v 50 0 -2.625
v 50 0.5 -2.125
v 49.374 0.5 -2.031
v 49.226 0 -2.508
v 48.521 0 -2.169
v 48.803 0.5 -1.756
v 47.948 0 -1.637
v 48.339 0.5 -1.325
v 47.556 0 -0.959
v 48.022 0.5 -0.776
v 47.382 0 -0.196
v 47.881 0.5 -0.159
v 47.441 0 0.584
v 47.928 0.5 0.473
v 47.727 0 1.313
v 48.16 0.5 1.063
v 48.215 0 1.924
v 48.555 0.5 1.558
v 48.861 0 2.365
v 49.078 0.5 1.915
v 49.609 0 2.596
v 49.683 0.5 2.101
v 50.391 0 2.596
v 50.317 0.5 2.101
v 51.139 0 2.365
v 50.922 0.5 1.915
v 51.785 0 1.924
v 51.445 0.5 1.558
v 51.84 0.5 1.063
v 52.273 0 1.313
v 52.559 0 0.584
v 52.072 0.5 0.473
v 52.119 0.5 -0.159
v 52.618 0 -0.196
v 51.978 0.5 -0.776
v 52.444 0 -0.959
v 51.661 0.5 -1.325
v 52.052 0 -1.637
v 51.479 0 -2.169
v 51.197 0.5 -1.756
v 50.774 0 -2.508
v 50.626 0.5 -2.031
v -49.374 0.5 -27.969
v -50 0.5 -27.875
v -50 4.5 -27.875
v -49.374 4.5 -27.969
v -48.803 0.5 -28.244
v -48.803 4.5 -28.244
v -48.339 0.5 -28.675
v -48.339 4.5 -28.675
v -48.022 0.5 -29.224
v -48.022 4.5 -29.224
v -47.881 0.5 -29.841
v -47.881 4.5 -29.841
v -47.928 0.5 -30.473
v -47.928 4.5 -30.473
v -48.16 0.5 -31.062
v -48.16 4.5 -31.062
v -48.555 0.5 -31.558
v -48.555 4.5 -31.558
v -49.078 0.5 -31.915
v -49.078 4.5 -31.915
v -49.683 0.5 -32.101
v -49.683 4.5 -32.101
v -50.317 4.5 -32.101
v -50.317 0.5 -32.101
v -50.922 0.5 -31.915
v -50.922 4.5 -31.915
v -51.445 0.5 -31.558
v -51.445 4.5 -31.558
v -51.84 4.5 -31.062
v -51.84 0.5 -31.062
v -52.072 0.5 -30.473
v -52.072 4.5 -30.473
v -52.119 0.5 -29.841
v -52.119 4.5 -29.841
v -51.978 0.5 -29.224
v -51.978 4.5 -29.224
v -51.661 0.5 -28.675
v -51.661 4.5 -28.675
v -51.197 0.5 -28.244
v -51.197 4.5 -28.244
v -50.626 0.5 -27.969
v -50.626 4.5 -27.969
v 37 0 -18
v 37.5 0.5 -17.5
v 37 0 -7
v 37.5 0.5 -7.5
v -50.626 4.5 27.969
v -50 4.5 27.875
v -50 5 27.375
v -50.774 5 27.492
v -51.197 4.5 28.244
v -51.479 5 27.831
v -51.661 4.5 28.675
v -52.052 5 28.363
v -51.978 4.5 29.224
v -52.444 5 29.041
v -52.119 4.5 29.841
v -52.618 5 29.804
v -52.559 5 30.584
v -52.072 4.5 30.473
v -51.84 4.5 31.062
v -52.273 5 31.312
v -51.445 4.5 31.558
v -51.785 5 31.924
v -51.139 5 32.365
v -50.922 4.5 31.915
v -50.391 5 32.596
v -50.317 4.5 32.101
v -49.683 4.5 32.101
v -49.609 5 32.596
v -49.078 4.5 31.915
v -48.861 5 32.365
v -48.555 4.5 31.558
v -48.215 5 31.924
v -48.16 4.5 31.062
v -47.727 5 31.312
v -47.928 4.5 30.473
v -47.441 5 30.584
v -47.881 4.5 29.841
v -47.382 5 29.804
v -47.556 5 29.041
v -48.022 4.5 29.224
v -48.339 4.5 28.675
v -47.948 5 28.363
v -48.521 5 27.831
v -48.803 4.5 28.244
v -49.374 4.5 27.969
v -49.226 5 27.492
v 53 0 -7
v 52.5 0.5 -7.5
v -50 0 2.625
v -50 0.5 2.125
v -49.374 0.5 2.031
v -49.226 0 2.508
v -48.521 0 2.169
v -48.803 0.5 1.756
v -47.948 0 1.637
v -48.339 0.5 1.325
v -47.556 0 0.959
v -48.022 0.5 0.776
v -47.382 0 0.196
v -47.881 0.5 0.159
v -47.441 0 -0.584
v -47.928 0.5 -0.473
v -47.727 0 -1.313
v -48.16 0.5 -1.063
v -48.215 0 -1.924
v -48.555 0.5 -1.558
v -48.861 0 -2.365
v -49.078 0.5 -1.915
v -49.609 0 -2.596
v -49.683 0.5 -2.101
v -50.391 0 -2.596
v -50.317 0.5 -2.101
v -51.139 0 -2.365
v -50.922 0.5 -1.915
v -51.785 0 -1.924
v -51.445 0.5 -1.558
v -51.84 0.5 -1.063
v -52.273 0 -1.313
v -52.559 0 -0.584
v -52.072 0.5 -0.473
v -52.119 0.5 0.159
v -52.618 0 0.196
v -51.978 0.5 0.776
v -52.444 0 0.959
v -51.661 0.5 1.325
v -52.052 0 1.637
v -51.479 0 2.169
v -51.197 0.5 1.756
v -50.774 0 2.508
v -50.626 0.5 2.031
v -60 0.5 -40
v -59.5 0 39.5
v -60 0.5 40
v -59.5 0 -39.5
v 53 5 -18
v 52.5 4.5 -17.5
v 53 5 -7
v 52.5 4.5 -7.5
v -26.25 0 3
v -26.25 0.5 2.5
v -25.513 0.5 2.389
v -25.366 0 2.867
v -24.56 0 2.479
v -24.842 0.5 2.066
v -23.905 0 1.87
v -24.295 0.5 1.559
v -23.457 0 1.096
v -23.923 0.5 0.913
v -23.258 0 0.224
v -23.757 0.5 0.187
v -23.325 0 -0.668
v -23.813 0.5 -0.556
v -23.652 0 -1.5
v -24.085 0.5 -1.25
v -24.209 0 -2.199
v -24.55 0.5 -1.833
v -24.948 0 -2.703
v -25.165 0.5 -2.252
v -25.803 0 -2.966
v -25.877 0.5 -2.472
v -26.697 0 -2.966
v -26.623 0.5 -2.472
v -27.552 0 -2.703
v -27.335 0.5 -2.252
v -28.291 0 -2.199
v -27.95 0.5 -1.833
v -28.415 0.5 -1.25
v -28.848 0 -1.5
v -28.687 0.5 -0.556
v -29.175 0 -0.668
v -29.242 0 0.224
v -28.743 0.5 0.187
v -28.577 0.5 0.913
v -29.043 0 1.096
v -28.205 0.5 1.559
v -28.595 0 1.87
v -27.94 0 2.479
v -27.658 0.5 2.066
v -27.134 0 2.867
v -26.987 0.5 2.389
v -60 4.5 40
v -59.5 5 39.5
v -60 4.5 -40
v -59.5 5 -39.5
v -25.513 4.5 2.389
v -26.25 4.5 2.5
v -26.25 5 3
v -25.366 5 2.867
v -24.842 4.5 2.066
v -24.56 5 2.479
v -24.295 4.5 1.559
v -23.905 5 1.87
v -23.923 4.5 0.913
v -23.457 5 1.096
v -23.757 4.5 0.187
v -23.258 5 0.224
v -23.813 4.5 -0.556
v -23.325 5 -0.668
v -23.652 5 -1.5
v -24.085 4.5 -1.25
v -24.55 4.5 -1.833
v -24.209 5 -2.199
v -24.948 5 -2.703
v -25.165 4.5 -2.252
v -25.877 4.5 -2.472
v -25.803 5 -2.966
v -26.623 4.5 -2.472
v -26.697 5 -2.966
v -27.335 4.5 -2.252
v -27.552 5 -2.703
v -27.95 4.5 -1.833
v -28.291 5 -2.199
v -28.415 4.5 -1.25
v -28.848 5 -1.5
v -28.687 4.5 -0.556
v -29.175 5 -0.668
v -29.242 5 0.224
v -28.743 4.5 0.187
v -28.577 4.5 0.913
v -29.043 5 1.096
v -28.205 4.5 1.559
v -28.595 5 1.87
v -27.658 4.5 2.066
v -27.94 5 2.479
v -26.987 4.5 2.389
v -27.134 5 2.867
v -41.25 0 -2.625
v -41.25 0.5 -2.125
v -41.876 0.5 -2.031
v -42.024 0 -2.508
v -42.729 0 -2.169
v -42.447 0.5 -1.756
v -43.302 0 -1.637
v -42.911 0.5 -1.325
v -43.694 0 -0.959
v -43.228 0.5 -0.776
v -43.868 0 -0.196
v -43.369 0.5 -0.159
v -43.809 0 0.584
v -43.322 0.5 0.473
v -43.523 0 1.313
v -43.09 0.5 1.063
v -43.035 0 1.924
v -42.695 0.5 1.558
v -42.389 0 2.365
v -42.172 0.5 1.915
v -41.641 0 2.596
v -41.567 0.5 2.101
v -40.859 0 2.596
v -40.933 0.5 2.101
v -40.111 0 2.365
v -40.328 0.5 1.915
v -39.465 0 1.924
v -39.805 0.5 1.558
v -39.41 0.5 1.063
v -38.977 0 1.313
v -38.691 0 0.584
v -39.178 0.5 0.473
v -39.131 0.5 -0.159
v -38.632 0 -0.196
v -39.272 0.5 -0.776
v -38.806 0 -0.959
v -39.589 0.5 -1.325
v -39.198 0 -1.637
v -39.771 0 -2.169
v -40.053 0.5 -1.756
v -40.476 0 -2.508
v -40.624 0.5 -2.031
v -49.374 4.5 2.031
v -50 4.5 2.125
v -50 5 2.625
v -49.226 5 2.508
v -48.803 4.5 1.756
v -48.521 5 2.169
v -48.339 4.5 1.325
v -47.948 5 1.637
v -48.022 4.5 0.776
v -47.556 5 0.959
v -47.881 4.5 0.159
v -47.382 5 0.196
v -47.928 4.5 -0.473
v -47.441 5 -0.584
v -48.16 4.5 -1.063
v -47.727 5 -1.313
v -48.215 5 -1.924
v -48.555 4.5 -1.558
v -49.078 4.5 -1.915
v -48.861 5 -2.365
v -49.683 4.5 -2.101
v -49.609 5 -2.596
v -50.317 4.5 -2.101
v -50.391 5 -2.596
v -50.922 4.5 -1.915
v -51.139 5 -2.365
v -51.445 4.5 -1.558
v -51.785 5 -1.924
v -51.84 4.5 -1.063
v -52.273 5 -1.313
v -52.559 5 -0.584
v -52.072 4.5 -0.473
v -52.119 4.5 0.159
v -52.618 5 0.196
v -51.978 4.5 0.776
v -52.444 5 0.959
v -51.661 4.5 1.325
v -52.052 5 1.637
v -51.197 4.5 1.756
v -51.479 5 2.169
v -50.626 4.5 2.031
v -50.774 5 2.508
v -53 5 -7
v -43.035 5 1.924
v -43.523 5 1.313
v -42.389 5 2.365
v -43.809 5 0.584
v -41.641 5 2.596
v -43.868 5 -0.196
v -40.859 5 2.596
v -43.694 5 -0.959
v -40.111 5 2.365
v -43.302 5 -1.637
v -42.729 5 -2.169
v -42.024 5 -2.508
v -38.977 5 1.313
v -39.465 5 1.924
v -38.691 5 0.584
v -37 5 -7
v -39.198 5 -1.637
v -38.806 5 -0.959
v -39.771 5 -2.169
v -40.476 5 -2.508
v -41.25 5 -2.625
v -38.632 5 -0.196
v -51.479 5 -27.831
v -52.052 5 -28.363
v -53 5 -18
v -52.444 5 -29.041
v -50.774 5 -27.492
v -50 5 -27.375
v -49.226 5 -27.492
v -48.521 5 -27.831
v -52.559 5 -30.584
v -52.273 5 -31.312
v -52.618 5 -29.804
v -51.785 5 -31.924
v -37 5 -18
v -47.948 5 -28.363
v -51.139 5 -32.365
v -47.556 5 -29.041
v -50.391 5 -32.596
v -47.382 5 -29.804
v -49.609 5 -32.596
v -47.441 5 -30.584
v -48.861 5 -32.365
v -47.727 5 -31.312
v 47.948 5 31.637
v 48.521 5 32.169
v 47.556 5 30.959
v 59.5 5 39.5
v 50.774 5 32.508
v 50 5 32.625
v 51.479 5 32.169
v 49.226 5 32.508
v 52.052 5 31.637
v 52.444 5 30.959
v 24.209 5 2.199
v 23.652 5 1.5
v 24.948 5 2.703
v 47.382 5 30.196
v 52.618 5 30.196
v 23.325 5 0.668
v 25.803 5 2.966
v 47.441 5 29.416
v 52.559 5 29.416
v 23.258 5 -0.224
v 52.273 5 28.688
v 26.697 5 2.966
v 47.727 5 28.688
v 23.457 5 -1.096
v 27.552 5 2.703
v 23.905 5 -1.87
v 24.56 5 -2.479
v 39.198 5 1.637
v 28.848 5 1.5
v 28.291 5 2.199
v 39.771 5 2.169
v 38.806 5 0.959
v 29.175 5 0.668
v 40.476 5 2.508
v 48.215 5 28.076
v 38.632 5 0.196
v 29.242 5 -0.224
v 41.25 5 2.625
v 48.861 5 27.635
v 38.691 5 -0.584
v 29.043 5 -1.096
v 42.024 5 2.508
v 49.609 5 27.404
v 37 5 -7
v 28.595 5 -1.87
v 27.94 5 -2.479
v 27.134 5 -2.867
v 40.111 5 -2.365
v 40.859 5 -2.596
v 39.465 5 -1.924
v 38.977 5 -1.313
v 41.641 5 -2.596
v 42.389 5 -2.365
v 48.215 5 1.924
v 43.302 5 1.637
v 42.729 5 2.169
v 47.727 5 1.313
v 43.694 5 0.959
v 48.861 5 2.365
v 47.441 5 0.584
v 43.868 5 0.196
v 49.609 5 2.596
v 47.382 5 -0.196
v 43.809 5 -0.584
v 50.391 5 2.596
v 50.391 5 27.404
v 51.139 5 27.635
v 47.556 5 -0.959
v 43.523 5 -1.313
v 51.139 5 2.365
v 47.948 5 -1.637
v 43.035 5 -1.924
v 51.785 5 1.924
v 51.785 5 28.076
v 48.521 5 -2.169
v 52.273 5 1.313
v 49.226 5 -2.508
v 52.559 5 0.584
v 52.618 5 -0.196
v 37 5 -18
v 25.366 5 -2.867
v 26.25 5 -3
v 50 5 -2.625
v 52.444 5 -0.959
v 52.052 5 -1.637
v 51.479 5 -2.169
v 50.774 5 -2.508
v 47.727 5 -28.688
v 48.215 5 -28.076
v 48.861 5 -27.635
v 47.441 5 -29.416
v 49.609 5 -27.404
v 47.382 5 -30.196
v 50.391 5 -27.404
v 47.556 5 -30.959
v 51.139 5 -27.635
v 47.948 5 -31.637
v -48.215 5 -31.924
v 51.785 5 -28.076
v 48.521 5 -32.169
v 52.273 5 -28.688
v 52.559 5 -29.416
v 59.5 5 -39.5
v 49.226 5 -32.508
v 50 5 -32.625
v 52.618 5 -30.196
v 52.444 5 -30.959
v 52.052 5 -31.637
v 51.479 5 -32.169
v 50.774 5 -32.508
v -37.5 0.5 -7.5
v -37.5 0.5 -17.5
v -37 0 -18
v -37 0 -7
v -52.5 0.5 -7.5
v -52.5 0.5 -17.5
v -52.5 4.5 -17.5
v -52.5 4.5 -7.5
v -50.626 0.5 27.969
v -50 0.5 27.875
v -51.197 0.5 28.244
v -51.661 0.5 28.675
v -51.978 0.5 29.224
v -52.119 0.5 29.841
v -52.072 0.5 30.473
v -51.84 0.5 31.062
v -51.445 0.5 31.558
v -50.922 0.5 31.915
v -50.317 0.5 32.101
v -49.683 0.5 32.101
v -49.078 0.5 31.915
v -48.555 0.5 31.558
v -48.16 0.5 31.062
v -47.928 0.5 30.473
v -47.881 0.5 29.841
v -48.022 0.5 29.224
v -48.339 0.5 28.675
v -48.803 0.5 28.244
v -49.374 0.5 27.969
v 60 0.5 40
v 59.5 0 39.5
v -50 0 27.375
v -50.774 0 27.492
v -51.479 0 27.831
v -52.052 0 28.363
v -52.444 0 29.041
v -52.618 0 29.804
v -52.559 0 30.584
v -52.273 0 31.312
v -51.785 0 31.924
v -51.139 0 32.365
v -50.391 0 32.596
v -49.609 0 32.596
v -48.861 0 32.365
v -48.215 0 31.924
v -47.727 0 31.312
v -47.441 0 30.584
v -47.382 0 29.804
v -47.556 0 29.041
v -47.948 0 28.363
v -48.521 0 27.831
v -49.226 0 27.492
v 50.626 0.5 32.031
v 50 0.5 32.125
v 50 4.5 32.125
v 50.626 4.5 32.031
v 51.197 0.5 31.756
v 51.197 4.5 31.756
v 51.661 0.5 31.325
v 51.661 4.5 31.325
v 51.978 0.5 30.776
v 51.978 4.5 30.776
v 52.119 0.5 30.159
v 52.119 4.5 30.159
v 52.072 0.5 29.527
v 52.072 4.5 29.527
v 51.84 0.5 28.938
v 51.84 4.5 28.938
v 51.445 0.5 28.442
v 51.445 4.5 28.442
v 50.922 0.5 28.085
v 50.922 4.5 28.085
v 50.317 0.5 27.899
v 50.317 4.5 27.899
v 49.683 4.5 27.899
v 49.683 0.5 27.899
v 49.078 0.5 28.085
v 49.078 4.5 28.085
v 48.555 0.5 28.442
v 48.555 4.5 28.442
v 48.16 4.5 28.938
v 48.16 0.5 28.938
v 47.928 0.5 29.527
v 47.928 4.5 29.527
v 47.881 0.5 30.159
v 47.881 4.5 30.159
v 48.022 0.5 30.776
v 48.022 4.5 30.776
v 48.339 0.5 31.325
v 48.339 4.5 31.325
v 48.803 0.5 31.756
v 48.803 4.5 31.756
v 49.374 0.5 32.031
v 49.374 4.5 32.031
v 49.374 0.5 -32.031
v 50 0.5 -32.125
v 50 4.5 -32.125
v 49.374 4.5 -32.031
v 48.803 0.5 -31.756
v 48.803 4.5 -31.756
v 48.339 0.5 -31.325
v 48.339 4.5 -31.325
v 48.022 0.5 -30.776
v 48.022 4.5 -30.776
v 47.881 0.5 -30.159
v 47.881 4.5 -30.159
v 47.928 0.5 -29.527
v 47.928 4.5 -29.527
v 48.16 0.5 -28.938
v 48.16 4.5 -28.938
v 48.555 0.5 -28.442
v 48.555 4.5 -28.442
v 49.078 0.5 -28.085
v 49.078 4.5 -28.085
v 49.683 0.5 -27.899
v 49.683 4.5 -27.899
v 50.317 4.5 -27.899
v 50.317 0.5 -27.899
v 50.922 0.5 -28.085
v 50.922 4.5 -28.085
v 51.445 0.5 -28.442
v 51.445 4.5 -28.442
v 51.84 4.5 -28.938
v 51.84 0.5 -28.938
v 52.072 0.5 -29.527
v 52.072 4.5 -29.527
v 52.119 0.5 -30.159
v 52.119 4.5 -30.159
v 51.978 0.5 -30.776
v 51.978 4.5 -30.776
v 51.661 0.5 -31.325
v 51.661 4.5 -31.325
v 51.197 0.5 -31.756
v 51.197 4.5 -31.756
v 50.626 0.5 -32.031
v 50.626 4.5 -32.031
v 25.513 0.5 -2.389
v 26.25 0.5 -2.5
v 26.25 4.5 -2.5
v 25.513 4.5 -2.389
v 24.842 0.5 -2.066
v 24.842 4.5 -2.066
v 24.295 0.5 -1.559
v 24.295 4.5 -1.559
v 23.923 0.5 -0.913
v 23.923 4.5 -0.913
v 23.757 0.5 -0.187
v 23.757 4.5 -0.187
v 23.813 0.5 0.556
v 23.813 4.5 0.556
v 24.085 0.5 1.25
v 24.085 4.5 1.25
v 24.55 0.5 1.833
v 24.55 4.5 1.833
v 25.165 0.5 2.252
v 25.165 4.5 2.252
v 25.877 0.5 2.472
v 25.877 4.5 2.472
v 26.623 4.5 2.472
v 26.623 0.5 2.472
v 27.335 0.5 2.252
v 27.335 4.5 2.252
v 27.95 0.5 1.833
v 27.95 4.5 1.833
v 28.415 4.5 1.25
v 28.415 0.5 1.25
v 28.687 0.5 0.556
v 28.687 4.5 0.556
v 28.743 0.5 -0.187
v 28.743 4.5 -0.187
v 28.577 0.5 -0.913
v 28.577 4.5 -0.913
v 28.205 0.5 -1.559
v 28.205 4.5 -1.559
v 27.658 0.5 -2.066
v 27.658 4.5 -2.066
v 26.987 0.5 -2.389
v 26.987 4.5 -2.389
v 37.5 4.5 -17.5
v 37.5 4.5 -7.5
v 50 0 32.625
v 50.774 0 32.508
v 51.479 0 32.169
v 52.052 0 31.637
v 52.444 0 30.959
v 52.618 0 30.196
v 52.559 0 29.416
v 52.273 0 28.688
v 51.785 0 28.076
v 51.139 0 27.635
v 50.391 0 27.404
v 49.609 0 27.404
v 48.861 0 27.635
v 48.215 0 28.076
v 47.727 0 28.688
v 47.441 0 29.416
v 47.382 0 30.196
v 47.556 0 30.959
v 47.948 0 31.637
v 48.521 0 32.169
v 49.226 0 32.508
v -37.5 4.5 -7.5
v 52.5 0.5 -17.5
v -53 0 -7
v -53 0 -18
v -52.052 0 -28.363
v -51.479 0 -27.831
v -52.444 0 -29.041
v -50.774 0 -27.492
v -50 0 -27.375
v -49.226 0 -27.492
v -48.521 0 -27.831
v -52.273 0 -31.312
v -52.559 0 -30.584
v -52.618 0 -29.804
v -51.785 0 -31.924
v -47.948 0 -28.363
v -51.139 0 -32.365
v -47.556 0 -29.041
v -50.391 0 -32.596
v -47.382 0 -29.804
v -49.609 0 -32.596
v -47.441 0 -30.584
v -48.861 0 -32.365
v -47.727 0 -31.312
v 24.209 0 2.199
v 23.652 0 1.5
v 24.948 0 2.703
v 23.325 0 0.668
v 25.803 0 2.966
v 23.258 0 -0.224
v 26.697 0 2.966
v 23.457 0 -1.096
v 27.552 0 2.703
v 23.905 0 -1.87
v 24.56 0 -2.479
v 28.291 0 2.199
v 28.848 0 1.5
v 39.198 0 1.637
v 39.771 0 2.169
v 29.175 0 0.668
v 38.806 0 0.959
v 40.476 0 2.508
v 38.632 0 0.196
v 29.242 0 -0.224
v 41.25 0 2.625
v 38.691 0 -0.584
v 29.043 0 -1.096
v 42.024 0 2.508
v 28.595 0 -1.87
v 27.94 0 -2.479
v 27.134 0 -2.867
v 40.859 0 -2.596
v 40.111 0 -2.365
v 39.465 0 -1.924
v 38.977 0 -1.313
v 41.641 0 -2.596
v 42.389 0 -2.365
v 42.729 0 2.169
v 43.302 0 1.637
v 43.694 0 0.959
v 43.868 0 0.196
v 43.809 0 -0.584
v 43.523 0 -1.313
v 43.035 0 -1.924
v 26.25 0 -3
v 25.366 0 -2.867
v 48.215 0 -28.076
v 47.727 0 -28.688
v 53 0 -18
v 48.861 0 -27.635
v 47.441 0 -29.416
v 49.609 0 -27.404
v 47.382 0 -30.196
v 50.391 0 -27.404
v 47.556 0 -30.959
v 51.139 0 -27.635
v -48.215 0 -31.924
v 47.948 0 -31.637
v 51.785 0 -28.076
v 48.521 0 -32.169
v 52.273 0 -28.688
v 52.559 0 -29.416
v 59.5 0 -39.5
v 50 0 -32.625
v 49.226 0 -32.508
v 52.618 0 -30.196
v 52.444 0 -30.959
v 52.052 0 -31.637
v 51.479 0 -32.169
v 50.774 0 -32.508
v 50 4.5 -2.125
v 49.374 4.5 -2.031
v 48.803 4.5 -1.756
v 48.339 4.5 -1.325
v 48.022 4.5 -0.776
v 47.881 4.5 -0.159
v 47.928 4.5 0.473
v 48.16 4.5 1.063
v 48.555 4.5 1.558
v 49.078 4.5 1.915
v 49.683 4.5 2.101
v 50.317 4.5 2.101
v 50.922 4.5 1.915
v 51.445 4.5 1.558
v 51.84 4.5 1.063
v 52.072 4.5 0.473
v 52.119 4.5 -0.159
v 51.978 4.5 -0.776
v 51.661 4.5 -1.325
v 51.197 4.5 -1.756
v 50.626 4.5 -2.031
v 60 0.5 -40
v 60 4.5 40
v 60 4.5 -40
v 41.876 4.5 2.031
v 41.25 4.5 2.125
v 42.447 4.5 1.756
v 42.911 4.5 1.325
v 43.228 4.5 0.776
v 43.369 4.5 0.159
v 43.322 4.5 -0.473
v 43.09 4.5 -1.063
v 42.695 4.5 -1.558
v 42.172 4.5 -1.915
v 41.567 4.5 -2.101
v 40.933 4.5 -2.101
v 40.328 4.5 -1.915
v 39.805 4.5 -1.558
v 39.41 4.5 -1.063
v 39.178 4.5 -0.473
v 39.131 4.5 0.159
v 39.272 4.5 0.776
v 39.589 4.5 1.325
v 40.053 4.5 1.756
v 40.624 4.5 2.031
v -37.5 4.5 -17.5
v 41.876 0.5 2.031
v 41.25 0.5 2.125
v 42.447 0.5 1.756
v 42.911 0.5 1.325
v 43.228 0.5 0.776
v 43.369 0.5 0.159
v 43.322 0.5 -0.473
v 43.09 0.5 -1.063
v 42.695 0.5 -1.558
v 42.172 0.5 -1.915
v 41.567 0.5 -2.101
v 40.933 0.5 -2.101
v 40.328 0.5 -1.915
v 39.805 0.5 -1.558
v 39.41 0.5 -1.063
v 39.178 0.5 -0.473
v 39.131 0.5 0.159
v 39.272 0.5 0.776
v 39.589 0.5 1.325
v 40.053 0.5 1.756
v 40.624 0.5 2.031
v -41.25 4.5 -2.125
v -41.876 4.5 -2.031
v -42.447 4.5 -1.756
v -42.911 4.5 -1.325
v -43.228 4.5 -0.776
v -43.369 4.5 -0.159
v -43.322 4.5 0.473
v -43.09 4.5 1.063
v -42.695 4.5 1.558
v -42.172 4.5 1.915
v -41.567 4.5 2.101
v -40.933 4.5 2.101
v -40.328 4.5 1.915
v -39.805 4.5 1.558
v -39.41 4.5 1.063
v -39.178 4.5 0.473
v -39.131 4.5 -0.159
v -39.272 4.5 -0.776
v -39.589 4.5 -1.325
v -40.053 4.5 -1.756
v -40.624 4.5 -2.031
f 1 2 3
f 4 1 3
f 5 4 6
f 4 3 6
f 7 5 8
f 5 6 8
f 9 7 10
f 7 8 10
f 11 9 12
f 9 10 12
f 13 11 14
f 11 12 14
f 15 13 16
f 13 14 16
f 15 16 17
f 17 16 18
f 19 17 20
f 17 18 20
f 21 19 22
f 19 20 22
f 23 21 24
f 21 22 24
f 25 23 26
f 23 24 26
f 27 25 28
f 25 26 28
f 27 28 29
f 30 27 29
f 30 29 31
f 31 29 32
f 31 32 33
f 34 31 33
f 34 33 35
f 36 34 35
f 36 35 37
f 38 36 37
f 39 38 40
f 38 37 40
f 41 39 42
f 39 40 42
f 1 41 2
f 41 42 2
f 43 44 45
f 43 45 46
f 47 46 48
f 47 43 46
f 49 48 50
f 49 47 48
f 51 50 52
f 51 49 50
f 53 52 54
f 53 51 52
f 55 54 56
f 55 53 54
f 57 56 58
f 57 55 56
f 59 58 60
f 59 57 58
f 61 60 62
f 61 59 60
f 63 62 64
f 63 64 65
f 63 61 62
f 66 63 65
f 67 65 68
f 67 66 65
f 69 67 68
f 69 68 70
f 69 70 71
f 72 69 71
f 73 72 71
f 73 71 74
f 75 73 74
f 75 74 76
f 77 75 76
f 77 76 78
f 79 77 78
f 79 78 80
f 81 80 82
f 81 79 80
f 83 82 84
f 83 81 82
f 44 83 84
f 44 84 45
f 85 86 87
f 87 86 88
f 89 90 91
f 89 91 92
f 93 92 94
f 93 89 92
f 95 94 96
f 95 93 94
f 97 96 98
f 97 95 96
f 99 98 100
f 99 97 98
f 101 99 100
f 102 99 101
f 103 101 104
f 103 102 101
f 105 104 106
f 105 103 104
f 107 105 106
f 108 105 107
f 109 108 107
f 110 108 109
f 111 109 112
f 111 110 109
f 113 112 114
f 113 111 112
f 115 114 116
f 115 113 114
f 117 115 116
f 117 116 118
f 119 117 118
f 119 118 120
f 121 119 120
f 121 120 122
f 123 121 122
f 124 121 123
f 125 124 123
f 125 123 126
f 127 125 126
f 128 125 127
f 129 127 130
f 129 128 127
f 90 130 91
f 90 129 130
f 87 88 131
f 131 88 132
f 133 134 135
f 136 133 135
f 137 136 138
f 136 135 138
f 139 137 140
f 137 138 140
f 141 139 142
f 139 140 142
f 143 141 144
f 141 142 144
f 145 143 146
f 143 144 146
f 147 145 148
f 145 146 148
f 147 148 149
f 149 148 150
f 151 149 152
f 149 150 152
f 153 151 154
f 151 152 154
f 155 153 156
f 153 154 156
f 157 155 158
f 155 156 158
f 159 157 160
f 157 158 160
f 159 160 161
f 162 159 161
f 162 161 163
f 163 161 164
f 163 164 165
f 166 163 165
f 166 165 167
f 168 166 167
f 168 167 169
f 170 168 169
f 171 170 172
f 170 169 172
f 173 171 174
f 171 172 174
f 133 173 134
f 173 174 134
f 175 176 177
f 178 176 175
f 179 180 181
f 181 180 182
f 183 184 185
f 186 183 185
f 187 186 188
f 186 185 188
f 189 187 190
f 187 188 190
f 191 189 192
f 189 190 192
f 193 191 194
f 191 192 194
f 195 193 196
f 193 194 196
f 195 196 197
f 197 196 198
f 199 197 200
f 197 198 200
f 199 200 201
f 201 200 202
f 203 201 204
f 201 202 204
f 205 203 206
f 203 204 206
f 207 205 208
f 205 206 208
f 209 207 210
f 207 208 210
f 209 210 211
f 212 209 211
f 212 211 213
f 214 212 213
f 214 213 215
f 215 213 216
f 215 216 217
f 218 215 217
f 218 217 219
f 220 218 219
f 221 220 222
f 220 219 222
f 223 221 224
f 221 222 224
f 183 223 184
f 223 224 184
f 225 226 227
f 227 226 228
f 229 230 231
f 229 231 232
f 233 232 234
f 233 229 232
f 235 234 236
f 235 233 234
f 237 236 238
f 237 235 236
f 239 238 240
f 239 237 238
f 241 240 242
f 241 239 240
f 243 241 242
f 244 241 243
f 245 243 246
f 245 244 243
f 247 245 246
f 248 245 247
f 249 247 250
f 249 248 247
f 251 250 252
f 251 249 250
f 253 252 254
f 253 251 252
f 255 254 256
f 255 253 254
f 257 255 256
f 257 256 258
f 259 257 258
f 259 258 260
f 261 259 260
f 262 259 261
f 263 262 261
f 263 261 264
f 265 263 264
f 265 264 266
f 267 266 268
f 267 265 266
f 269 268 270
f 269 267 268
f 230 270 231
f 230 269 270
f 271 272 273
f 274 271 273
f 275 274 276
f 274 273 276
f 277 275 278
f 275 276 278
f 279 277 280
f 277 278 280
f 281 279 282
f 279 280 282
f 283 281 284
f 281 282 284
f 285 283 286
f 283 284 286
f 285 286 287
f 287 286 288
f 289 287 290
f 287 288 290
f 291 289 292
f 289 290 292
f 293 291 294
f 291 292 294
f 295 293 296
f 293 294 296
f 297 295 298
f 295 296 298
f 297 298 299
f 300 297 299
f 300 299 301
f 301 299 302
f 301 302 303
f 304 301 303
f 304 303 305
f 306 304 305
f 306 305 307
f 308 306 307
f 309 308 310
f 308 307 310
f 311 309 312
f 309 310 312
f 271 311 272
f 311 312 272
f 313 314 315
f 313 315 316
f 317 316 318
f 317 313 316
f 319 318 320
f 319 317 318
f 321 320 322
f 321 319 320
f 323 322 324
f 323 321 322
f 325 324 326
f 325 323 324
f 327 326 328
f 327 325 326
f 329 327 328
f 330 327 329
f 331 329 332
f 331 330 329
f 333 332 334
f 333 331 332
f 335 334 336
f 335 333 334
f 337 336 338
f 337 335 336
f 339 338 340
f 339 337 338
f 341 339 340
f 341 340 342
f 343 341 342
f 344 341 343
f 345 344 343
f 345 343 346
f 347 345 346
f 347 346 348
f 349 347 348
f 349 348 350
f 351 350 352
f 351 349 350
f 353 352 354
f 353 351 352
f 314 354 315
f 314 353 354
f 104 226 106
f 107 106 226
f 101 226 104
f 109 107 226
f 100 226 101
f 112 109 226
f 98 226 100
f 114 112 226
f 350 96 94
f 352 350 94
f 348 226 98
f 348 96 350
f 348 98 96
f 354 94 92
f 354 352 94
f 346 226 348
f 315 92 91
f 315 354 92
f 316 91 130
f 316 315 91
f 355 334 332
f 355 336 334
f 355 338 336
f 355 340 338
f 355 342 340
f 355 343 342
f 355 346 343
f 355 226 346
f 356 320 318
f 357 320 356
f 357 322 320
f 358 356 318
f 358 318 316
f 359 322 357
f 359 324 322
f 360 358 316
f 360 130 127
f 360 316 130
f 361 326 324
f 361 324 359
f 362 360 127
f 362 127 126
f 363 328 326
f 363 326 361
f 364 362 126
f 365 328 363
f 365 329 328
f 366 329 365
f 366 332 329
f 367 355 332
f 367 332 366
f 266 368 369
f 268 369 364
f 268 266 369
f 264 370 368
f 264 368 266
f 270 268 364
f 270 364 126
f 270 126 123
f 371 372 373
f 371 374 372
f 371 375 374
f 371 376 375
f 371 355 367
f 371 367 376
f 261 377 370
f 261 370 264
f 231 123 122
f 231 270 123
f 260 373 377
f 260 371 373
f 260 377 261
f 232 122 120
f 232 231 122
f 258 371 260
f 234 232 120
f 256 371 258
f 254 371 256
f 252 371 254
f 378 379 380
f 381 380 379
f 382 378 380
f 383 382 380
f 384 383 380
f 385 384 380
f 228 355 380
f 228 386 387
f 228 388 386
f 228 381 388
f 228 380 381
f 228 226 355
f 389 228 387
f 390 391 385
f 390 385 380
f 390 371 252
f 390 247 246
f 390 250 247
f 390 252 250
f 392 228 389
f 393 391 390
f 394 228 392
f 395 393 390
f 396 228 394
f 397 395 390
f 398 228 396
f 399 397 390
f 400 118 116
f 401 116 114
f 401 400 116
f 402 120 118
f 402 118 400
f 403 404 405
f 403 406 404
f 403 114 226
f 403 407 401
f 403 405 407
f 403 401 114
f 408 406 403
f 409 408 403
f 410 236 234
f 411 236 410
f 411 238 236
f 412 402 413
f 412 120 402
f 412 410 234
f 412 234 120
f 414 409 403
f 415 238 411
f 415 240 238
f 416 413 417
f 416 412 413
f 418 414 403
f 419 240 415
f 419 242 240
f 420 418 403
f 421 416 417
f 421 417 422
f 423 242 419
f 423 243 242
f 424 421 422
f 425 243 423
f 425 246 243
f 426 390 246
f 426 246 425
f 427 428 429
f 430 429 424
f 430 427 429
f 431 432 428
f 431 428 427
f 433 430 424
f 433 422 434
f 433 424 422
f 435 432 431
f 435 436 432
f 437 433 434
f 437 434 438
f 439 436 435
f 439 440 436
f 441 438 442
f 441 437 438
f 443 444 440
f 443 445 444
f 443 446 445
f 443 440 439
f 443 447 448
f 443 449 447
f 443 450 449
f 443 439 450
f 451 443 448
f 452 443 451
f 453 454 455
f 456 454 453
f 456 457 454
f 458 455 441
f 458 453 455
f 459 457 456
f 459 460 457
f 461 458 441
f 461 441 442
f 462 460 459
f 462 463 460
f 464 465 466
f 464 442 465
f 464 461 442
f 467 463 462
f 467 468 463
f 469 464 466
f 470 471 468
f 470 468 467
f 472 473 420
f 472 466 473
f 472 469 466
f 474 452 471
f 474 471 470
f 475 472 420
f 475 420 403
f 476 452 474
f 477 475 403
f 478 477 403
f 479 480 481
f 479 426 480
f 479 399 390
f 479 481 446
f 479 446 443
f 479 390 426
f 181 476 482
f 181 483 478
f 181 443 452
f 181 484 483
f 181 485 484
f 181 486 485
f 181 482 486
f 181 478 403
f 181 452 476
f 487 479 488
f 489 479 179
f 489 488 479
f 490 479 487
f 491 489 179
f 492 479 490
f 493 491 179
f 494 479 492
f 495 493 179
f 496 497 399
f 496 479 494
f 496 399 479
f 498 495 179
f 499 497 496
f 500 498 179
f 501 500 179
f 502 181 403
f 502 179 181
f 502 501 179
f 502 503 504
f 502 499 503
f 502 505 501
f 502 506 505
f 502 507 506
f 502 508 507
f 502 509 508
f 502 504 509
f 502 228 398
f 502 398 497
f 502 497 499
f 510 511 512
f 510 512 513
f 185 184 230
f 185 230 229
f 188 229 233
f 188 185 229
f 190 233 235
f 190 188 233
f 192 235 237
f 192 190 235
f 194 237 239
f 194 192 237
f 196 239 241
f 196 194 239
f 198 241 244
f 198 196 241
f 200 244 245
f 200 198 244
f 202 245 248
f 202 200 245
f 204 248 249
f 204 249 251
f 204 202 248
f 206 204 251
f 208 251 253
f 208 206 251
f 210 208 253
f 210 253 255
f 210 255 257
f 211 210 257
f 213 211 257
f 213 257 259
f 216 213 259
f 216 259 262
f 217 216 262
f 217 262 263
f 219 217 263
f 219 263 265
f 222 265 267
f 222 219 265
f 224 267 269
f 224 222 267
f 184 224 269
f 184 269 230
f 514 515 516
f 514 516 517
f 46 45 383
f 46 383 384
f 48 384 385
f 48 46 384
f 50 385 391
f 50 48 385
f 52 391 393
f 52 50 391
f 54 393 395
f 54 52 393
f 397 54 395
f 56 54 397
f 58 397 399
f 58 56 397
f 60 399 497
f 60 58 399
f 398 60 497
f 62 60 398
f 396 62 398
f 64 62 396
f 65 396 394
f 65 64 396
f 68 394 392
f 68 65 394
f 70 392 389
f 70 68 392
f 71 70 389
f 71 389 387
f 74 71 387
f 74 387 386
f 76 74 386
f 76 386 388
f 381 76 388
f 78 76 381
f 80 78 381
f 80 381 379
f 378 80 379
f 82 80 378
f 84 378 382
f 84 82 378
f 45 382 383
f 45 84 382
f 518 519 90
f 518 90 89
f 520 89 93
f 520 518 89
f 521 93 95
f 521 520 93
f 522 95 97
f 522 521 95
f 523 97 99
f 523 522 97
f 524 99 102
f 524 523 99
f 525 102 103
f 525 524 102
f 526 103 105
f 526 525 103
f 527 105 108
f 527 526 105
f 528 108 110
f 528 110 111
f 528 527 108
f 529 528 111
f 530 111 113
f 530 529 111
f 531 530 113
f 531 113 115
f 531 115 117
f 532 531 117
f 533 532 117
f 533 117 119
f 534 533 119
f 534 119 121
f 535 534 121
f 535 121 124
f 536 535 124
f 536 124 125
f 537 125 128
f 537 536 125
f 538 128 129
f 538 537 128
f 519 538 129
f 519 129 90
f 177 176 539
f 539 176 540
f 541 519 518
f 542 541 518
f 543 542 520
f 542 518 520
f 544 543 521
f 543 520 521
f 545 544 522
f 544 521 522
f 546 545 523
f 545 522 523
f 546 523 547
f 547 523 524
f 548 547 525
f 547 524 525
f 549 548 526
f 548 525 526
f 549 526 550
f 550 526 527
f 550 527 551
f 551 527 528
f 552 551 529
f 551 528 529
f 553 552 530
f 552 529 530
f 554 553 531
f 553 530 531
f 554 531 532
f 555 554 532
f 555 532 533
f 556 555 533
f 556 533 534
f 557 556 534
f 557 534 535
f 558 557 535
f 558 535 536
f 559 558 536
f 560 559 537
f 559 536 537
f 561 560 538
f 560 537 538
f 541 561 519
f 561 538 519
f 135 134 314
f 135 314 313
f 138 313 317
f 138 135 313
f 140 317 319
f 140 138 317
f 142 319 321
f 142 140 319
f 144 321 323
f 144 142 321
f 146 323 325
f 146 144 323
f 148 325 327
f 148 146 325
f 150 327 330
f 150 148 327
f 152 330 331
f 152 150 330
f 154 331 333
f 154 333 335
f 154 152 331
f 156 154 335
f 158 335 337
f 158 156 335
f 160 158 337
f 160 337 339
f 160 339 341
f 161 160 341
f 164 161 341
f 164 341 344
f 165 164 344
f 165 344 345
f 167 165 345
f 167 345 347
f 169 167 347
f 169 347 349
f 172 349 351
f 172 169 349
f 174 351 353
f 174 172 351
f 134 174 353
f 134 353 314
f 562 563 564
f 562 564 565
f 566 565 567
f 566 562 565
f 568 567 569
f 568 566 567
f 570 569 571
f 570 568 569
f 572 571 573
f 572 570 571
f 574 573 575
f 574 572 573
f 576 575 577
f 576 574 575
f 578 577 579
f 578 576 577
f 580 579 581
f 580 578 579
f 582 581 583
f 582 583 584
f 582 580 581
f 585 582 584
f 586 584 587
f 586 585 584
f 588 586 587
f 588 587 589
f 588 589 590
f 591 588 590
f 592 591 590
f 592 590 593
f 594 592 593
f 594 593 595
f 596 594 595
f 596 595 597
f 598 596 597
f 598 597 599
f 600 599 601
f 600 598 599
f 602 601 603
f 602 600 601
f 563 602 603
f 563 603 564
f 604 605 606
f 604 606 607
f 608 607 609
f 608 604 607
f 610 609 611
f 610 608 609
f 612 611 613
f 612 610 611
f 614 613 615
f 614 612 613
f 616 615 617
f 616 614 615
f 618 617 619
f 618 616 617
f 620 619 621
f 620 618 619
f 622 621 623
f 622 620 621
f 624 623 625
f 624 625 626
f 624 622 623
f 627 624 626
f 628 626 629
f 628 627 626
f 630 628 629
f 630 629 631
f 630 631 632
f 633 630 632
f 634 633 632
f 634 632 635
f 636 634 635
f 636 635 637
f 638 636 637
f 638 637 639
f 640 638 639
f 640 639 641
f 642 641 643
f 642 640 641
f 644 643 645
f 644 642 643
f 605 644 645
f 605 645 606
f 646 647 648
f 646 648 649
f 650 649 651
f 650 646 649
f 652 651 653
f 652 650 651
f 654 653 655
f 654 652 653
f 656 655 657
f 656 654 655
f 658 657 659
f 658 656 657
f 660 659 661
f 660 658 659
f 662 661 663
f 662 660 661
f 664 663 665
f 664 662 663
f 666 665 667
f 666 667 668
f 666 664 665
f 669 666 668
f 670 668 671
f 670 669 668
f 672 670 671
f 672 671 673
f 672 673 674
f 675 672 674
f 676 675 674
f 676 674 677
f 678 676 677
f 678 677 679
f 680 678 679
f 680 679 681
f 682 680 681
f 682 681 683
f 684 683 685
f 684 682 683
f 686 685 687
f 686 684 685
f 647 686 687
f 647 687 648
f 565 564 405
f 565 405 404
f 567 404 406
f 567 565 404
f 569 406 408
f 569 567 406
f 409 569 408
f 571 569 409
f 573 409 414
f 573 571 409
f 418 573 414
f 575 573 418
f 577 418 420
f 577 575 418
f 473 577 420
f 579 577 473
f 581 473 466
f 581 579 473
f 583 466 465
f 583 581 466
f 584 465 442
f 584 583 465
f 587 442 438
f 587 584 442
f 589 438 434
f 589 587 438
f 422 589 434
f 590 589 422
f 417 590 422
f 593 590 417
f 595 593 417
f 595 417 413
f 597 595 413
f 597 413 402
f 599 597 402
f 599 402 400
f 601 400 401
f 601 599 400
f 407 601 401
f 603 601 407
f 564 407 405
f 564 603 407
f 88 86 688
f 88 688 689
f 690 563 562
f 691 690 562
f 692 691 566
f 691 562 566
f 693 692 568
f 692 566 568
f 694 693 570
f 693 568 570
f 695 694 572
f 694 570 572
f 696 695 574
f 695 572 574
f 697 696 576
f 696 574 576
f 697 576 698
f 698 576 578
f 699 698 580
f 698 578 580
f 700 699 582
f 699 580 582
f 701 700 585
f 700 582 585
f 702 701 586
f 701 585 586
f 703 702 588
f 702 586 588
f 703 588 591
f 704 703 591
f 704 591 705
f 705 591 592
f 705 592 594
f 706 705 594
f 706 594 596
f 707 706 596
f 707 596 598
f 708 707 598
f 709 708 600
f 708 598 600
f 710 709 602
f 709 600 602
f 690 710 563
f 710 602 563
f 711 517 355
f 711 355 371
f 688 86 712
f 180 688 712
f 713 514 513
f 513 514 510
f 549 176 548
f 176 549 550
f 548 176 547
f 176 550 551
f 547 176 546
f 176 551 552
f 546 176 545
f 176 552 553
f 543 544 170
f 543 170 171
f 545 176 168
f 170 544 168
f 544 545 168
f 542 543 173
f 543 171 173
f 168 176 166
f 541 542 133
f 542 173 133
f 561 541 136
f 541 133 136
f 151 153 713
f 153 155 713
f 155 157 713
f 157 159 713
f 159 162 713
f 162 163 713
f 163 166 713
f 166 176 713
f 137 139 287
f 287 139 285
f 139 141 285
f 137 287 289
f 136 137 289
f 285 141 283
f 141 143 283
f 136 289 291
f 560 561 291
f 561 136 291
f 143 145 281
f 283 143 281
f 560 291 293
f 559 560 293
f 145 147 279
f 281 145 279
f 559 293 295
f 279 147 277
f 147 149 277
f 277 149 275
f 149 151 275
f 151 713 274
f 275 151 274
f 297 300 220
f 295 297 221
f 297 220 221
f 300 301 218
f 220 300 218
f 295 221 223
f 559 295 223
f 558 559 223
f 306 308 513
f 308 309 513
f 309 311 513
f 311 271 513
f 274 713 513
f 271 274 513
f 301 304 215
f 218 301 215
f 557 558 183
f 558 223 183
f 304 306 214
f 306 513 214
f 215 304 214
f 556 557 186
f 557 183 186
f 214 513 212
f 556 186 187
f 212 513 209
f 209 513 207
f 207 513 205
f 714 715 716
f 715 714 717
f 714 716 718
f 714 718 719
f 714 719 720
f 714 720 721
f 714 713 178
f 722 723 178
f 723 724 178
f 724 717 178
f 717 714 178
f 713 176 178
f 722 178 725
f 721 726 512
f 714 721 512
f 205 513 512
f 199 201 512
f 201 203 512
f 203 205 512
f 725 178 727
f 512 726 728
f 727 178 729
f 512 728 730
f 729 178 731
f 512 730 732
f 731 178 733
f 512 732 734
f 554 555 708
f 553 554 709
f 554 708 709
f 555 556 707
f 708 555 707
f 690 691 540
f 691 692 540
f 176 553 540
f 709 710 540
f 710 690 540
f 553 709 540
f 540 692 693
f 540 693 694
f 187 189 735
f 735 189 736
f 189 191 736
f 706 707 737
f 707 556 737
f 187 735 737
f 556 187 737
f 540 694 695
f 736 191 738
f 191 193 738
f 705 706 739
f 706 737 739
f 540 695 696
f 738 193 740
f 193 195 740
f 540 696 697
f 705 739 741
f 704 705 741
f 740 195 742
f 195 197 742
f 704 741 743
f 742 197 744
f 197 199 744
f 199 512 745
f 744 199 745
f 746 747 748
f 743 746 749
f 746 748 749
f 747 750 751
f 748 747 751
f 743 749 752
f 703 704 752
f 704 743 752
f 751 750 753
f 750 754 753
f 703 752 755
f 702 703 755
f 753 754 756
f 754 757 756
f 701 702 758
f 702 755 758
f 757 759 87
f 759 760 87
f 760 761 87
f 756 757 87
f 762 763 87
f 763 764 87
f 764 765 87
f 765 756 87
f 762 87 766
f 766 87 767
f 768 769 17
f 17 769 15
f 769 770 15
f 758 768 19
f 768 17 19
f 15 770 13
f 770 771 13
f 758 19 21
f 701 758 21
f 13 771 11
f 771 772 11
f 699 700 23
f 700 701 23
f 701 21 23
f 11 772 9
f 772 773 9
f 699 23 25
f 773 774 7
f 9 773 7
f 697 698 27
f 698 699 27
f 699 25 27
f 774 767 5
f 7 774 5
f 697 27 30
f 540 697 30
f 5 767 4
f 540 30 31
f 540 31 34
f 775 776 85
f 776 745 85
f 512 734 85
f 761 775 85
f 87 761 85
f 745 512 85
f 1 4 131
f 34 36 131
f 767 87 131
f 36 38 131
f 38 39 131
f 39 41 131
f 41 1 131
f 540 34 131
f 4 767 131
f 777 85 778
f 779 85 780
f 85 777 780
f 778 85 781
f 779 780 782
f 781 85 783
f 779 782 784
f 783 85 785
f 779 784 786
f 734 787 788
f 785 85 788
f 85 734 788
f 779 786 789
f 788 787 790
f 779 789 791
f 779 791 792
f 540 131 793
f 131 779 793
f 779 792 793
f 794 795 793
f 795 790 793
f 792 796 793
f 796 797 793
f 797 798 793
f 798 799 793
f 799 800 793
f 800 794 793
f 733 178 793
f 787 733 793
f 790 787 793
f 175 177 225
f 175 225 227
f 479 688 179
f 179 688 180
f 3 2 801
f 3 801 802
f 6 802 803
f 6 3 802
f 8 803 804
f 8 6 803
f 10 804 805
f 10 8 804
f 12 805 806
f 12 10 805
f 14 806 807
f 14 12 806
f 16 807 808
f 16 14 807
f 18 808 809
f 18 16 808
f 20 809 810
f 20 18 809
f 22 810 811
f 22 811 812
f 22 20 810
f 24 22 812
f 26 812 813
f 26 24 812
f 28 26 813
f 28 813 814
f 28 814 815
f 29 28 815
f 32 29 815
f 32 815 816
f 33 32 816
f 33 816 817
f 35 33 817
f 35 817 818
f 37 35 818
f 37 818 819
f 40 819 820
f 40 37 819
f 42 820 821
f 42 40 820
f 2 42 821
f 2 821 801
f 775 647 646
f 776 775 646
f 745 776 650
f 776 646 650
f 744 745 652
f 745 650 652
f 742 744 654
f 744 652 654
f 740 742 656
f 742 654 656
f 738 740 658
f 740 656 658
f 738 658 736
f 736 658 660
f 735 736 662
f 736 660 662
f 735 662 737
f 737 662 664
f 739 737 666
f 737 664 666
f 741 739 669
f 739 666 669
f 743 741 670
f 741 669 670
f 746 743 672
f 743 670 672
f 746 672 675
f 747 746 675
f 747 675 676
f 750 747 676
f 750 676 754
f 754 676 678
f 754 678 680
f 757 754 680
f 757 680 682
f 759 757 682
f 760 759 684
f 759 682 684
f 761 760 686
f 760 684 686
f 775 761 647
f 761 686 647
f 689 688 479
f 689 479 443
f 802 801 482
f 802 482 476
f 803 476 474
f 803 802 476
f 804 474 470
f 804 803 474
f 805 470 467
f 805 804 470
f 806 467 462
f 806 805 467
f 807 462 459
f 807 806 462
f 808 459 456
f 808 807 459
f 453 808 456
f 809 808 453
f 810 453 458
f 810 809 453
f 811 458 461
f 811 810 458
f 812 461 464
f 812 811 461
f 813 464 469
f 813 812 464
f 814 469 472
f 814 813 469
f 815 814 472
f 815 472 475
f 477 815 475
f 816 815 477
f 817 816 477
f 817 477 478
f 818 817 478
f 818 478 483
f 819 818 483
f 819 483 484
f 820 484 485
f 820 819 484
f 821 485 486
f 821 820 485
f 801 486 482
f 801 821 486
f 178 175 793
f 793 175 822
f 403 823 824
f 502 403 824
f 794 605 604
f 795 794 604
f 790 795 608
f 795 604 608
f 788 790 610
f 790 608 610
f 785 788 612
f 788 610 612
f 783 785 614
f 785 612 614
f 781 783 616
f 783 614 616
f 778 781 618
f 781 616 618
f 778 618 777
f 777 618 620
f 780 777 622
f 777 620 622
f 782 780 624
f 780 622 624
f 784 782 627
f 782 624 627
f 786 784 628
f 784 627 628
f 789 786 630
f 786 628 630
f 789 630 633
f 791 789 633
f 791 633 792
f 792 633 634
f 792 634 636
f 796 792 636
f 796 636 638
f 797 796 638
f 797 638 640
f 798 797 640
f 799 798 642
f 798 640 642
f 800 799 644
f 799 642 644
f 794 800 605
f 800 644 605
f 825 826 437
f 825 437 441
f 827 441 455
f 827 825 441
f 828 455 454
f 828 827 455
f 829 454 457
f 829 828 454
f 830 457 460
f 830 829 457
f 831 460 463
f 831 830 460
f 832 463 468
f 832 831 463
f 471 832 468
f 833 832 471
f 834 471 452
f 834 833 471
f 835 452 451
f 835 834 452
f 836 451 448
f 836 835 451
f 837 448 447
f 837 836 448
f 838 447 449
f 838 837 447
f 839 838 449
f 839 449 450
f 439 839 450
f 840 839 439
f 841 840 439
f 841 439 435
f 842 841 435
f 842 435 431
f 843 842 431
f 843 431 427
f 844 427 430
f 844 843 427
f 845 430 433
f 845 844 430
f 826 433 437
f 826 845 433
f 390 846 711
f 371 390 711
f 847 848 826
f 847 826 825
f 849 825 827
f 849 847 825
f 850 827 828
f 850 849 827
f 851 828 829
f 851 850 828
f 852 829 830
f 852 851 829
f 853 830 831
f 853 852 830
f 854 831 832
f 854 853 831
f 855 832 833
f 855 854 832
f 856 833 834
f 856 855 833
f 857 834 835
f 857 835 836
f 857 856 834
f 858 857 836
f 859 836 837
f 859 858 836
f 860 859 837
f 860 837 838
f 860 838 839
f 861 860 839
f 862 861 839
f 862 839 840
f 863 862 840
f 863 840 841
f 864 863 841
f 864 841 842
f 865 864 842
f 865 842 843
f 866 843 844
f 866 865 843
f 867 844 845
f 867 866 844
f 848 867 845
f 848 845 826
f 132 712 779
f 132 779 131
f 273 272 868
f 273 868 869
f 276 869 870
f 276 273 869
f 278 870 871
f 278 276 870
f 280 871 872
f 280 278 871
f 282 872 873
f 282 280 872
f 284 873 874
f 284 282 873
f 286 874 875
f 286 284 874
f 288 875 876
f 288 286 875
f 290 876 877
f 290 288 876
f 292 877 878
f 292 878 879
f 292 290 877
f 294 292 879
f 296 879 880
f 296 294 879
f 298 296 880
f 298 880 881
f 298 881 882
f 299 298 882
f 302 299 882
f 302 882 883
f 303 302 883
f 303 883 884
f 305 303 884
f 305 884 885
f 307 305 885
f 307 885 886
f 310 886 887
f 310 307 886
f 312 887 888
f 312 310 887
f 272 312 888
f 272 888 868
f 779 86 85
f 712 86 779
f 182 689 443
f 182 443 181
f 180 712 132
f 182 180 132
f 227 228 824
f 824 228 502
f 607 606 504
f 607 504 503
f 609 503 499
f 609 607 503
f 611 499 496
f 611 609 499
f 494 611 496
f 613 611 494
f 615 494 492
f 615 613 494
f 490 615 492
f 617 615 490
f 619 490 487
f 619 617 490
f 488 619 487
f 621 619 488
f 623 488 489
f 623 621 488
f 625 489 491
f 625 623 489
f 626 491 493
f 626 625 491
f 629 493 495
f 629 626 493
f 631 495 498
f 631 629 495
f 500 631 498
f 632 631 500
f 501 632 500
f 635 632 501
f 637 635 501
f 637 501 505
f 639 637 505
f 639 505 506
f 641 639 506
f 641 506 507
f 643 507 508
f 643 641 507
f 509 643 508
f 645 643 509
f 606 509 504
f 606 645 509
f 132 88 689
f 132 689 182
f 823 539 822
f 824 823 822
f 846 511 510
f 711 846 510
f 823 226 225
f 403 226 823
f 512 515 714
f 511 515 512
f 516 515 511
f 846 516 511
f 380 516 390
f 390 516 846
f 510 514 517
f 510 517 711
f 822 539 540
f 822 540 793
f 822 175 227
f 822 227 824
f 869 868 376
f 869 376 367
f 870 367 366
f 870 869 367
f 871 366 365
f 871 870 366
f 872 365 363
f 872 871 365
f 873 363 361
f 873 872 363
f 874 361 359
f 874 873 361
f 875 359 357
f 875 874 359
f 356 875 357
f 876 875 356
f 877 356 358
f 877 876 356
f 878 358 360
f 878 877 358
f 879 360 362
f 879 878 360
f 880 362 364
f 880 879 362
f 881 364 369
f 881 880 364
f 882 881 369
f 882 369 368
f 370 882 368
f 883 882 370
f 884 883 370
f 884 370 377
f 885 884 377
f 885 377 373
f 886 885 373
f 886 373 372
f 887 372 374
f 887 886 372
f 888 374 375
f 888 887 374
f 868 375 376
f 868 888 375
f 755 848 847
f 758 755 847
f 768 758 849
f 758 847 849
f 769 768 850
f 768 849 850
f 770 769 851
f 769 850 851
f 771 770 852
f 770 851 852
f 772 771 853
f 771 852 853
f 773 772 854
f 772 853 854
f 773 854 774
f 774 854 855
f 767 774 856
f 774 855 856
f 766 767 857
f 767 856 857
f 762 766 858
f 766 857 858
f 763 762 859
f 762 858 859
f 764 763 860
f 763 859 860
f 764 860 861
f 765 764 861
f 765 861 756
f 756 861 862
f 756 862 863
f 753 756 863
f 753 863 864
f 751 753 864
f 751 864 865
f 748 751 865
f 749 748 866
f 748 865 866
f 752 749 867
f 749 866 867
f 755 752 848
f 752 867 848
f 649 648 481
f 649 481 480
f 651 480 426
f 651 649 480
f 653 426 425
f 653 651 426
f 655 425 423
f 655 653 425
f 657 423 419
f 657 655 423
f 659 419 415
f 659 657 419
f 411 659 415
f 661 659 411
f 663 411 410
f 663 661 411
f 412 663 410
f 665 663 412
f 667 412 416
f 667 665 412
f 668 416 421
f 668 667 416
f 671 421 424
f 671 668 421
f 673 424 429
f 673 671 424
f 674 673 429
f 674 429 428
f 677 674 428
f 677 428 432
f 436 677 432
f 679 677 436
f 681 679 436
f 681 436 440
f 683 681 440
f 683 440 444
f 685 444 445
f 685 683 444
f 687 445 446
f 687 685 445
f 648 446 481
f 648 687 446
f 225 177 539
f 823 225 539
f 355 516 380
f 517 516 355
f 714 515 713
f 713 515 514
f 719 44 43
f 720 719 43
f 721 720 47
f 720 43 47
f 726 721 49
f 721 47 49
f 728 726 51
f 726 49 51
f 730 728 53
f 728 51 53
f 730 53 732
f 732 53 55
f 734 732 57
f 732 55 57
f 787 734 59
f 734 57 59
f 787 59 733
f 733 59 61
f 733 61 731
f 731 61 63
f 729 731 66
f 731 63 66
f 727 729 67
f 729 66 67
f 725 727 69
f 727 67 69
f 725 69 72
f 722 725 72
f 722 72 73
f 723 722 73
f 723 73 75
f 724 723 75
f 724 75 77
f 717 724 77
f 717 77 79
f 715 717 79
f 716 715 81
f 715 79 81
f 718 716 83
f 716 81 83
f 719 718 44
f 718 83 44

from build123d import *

# Parameters (mm, degrees)
SKETCH1_W           = 120
SKETCH1_H           = 80
SKETCH1_R           = 2.125
SKETCH1_R_2         = 2.5
BOSS_EXTRUDE1_DEPTH = 5
SKETCH3_W           = 15
SKETCH3_H           = 10
CUT_EXTRUDE1_DEPTH  = 5
CHAMFER2_SIZE       = 0.5
CHAMFER3_SIZE       = 0.5


with BuildPart() as part:
    # Sketch1 → Boss-Extrude1 (new body)
    with BuildSketch(Plane(origin=(0, 0, 0), x_dir=(1, 0, 0), z_dir=(0, 1, 0))):
        Rectangle(SKETCH1_W, SKETCH1_H)
        with Locations(Location((-50, 30, 0), (0, 0, 270))):
            Circle(SKETCH1_R, mode=Mode.SUBTRACT)
        with Locations(Location((-50, -30, 0), (0, 0, 90))):
            Circle(SKETCH1_R, mode=Mode.SUBTRACT)
        with Locations(Location((50, -30, 0), (0, 0, 270))):
            Circle(SKETCH1_R, mode=Mode.SUBTRACT)
        with Locations(Location((50, 30, 0), (0, 0, 90))):
            Circle(SKETCH1_R, mode=Mode.SUBTRACT)
        with Locations(Location((-26.25, 0, 0), (0, 0, 270))):
            Circle(SKETCH1_R_2, mode=Mode.SUBTRACT)
        with Locations(Location((26.25, 0, 0), (0, 0, 90))):
            Circle(SKETCH1_R_2, mode=Mode.SUBTRACT)
        with Locations(Location((-50, 0, 0), (0, 0, 270))):
            Circle(SKETCH1_R, mode=Mode.SUBTRACT)
        with Locations(Location((50, 0, 0), (0, 0, 90))):
            Circle(SKETCH1_R, mode=Mode.SUBTRACT)
        with Locations(Location((41.25, 0, 0), (0, 0, 270))):
            Circle(SKETCH1_R, mode=Mode.SUBTRACT)
        with Locations(Location((-41.25, 0, 0), (0, 0, 90))):
            Circle(SKETCH1_R, mode=Mode.SUBTRACT)
    extrude(amount=BOSS_EXTRUDE1_DEPTH)

    # Sketch3 → Cut-Extrude1 (cut)
    with BuildSketch(Plane.XZ):
        with Locations((45, -12.5)):
            Rectangle(SKETCH3_W, SKETCH3_H)
        with Locations((-45, -12.5)):
            Rectangle(SKETCH3_W, SKETCH3_H)
    extrude(amount=-CUT_EXTRUDE1_DEPTH, mode=Mode.SUBTRACT)

    # Chamfer2
    chamfer2_edges = [part.edges().sort_by_distance(p)[0] for p in [
        (-50, 5, -32.125),
        (-60, 5, 0),
        (50, 5, 27.875),
        (0, 5, 40),
        (-50, 5, 32.125),
        (50, 5, -27.875),
        (-26.25, 5, -2.5),
        (26.25, 5, 2.5),
        (-50, 5, -2.125),
        (50, 5, 2.125),
        (41.25, 5, -2.125),
        (-41.25, 5, 2.125),
        (60, 5, 0),
        (52.5, 5, -12.5),
        (45, 5, -17.5),
        (37.5, 5, -12.5),
        (45, 5, -7.5),
        (-37.5, 5, -12.5),
        (-45, 5, -17.5),
        (-52.5, 5, -12.5),
        (-45, 5, -7.5),
        (0, 5, -40),
    ]]
    chamfer(chamfer2_edges, length=CHAMFER2_SIZE)

    # Chamfer3
    chamfer3_edges = [part.edges().sort_by_distance(p)[0] for p in [
        (-50, 0, -32.125),
        (50, 0, 27.875),
        (-50, 0, 32.125),
        (50, 0, -27.875),
        (-26.25, 0, -2.5),
        (26.25, 0, 2.5),
        (-50, 0, -2.125),
        (50, 0, 2.125),
        (41.25, 0, -2.125),
        (-41.25, 0, 2.125),
        (0, 0, 40),
        (-60, 0, 0),
        (0, 0, -40),
        (60, 0, 0),
        (52.5, 0, -12.5),
        (45, 0, -7.5),
        (37.5, 0, -12.5),
        (45, 0, -17.5),
        (-37.5, 0, -12.5),
        (-45, 0, -7.5),
        (-52.5, 0, -12.5),
        (-45, 0, -17.5),
    ]]
    chamfer(chamfer3_edges, length=CHAMFER3_SIZE)


solid = part.part
